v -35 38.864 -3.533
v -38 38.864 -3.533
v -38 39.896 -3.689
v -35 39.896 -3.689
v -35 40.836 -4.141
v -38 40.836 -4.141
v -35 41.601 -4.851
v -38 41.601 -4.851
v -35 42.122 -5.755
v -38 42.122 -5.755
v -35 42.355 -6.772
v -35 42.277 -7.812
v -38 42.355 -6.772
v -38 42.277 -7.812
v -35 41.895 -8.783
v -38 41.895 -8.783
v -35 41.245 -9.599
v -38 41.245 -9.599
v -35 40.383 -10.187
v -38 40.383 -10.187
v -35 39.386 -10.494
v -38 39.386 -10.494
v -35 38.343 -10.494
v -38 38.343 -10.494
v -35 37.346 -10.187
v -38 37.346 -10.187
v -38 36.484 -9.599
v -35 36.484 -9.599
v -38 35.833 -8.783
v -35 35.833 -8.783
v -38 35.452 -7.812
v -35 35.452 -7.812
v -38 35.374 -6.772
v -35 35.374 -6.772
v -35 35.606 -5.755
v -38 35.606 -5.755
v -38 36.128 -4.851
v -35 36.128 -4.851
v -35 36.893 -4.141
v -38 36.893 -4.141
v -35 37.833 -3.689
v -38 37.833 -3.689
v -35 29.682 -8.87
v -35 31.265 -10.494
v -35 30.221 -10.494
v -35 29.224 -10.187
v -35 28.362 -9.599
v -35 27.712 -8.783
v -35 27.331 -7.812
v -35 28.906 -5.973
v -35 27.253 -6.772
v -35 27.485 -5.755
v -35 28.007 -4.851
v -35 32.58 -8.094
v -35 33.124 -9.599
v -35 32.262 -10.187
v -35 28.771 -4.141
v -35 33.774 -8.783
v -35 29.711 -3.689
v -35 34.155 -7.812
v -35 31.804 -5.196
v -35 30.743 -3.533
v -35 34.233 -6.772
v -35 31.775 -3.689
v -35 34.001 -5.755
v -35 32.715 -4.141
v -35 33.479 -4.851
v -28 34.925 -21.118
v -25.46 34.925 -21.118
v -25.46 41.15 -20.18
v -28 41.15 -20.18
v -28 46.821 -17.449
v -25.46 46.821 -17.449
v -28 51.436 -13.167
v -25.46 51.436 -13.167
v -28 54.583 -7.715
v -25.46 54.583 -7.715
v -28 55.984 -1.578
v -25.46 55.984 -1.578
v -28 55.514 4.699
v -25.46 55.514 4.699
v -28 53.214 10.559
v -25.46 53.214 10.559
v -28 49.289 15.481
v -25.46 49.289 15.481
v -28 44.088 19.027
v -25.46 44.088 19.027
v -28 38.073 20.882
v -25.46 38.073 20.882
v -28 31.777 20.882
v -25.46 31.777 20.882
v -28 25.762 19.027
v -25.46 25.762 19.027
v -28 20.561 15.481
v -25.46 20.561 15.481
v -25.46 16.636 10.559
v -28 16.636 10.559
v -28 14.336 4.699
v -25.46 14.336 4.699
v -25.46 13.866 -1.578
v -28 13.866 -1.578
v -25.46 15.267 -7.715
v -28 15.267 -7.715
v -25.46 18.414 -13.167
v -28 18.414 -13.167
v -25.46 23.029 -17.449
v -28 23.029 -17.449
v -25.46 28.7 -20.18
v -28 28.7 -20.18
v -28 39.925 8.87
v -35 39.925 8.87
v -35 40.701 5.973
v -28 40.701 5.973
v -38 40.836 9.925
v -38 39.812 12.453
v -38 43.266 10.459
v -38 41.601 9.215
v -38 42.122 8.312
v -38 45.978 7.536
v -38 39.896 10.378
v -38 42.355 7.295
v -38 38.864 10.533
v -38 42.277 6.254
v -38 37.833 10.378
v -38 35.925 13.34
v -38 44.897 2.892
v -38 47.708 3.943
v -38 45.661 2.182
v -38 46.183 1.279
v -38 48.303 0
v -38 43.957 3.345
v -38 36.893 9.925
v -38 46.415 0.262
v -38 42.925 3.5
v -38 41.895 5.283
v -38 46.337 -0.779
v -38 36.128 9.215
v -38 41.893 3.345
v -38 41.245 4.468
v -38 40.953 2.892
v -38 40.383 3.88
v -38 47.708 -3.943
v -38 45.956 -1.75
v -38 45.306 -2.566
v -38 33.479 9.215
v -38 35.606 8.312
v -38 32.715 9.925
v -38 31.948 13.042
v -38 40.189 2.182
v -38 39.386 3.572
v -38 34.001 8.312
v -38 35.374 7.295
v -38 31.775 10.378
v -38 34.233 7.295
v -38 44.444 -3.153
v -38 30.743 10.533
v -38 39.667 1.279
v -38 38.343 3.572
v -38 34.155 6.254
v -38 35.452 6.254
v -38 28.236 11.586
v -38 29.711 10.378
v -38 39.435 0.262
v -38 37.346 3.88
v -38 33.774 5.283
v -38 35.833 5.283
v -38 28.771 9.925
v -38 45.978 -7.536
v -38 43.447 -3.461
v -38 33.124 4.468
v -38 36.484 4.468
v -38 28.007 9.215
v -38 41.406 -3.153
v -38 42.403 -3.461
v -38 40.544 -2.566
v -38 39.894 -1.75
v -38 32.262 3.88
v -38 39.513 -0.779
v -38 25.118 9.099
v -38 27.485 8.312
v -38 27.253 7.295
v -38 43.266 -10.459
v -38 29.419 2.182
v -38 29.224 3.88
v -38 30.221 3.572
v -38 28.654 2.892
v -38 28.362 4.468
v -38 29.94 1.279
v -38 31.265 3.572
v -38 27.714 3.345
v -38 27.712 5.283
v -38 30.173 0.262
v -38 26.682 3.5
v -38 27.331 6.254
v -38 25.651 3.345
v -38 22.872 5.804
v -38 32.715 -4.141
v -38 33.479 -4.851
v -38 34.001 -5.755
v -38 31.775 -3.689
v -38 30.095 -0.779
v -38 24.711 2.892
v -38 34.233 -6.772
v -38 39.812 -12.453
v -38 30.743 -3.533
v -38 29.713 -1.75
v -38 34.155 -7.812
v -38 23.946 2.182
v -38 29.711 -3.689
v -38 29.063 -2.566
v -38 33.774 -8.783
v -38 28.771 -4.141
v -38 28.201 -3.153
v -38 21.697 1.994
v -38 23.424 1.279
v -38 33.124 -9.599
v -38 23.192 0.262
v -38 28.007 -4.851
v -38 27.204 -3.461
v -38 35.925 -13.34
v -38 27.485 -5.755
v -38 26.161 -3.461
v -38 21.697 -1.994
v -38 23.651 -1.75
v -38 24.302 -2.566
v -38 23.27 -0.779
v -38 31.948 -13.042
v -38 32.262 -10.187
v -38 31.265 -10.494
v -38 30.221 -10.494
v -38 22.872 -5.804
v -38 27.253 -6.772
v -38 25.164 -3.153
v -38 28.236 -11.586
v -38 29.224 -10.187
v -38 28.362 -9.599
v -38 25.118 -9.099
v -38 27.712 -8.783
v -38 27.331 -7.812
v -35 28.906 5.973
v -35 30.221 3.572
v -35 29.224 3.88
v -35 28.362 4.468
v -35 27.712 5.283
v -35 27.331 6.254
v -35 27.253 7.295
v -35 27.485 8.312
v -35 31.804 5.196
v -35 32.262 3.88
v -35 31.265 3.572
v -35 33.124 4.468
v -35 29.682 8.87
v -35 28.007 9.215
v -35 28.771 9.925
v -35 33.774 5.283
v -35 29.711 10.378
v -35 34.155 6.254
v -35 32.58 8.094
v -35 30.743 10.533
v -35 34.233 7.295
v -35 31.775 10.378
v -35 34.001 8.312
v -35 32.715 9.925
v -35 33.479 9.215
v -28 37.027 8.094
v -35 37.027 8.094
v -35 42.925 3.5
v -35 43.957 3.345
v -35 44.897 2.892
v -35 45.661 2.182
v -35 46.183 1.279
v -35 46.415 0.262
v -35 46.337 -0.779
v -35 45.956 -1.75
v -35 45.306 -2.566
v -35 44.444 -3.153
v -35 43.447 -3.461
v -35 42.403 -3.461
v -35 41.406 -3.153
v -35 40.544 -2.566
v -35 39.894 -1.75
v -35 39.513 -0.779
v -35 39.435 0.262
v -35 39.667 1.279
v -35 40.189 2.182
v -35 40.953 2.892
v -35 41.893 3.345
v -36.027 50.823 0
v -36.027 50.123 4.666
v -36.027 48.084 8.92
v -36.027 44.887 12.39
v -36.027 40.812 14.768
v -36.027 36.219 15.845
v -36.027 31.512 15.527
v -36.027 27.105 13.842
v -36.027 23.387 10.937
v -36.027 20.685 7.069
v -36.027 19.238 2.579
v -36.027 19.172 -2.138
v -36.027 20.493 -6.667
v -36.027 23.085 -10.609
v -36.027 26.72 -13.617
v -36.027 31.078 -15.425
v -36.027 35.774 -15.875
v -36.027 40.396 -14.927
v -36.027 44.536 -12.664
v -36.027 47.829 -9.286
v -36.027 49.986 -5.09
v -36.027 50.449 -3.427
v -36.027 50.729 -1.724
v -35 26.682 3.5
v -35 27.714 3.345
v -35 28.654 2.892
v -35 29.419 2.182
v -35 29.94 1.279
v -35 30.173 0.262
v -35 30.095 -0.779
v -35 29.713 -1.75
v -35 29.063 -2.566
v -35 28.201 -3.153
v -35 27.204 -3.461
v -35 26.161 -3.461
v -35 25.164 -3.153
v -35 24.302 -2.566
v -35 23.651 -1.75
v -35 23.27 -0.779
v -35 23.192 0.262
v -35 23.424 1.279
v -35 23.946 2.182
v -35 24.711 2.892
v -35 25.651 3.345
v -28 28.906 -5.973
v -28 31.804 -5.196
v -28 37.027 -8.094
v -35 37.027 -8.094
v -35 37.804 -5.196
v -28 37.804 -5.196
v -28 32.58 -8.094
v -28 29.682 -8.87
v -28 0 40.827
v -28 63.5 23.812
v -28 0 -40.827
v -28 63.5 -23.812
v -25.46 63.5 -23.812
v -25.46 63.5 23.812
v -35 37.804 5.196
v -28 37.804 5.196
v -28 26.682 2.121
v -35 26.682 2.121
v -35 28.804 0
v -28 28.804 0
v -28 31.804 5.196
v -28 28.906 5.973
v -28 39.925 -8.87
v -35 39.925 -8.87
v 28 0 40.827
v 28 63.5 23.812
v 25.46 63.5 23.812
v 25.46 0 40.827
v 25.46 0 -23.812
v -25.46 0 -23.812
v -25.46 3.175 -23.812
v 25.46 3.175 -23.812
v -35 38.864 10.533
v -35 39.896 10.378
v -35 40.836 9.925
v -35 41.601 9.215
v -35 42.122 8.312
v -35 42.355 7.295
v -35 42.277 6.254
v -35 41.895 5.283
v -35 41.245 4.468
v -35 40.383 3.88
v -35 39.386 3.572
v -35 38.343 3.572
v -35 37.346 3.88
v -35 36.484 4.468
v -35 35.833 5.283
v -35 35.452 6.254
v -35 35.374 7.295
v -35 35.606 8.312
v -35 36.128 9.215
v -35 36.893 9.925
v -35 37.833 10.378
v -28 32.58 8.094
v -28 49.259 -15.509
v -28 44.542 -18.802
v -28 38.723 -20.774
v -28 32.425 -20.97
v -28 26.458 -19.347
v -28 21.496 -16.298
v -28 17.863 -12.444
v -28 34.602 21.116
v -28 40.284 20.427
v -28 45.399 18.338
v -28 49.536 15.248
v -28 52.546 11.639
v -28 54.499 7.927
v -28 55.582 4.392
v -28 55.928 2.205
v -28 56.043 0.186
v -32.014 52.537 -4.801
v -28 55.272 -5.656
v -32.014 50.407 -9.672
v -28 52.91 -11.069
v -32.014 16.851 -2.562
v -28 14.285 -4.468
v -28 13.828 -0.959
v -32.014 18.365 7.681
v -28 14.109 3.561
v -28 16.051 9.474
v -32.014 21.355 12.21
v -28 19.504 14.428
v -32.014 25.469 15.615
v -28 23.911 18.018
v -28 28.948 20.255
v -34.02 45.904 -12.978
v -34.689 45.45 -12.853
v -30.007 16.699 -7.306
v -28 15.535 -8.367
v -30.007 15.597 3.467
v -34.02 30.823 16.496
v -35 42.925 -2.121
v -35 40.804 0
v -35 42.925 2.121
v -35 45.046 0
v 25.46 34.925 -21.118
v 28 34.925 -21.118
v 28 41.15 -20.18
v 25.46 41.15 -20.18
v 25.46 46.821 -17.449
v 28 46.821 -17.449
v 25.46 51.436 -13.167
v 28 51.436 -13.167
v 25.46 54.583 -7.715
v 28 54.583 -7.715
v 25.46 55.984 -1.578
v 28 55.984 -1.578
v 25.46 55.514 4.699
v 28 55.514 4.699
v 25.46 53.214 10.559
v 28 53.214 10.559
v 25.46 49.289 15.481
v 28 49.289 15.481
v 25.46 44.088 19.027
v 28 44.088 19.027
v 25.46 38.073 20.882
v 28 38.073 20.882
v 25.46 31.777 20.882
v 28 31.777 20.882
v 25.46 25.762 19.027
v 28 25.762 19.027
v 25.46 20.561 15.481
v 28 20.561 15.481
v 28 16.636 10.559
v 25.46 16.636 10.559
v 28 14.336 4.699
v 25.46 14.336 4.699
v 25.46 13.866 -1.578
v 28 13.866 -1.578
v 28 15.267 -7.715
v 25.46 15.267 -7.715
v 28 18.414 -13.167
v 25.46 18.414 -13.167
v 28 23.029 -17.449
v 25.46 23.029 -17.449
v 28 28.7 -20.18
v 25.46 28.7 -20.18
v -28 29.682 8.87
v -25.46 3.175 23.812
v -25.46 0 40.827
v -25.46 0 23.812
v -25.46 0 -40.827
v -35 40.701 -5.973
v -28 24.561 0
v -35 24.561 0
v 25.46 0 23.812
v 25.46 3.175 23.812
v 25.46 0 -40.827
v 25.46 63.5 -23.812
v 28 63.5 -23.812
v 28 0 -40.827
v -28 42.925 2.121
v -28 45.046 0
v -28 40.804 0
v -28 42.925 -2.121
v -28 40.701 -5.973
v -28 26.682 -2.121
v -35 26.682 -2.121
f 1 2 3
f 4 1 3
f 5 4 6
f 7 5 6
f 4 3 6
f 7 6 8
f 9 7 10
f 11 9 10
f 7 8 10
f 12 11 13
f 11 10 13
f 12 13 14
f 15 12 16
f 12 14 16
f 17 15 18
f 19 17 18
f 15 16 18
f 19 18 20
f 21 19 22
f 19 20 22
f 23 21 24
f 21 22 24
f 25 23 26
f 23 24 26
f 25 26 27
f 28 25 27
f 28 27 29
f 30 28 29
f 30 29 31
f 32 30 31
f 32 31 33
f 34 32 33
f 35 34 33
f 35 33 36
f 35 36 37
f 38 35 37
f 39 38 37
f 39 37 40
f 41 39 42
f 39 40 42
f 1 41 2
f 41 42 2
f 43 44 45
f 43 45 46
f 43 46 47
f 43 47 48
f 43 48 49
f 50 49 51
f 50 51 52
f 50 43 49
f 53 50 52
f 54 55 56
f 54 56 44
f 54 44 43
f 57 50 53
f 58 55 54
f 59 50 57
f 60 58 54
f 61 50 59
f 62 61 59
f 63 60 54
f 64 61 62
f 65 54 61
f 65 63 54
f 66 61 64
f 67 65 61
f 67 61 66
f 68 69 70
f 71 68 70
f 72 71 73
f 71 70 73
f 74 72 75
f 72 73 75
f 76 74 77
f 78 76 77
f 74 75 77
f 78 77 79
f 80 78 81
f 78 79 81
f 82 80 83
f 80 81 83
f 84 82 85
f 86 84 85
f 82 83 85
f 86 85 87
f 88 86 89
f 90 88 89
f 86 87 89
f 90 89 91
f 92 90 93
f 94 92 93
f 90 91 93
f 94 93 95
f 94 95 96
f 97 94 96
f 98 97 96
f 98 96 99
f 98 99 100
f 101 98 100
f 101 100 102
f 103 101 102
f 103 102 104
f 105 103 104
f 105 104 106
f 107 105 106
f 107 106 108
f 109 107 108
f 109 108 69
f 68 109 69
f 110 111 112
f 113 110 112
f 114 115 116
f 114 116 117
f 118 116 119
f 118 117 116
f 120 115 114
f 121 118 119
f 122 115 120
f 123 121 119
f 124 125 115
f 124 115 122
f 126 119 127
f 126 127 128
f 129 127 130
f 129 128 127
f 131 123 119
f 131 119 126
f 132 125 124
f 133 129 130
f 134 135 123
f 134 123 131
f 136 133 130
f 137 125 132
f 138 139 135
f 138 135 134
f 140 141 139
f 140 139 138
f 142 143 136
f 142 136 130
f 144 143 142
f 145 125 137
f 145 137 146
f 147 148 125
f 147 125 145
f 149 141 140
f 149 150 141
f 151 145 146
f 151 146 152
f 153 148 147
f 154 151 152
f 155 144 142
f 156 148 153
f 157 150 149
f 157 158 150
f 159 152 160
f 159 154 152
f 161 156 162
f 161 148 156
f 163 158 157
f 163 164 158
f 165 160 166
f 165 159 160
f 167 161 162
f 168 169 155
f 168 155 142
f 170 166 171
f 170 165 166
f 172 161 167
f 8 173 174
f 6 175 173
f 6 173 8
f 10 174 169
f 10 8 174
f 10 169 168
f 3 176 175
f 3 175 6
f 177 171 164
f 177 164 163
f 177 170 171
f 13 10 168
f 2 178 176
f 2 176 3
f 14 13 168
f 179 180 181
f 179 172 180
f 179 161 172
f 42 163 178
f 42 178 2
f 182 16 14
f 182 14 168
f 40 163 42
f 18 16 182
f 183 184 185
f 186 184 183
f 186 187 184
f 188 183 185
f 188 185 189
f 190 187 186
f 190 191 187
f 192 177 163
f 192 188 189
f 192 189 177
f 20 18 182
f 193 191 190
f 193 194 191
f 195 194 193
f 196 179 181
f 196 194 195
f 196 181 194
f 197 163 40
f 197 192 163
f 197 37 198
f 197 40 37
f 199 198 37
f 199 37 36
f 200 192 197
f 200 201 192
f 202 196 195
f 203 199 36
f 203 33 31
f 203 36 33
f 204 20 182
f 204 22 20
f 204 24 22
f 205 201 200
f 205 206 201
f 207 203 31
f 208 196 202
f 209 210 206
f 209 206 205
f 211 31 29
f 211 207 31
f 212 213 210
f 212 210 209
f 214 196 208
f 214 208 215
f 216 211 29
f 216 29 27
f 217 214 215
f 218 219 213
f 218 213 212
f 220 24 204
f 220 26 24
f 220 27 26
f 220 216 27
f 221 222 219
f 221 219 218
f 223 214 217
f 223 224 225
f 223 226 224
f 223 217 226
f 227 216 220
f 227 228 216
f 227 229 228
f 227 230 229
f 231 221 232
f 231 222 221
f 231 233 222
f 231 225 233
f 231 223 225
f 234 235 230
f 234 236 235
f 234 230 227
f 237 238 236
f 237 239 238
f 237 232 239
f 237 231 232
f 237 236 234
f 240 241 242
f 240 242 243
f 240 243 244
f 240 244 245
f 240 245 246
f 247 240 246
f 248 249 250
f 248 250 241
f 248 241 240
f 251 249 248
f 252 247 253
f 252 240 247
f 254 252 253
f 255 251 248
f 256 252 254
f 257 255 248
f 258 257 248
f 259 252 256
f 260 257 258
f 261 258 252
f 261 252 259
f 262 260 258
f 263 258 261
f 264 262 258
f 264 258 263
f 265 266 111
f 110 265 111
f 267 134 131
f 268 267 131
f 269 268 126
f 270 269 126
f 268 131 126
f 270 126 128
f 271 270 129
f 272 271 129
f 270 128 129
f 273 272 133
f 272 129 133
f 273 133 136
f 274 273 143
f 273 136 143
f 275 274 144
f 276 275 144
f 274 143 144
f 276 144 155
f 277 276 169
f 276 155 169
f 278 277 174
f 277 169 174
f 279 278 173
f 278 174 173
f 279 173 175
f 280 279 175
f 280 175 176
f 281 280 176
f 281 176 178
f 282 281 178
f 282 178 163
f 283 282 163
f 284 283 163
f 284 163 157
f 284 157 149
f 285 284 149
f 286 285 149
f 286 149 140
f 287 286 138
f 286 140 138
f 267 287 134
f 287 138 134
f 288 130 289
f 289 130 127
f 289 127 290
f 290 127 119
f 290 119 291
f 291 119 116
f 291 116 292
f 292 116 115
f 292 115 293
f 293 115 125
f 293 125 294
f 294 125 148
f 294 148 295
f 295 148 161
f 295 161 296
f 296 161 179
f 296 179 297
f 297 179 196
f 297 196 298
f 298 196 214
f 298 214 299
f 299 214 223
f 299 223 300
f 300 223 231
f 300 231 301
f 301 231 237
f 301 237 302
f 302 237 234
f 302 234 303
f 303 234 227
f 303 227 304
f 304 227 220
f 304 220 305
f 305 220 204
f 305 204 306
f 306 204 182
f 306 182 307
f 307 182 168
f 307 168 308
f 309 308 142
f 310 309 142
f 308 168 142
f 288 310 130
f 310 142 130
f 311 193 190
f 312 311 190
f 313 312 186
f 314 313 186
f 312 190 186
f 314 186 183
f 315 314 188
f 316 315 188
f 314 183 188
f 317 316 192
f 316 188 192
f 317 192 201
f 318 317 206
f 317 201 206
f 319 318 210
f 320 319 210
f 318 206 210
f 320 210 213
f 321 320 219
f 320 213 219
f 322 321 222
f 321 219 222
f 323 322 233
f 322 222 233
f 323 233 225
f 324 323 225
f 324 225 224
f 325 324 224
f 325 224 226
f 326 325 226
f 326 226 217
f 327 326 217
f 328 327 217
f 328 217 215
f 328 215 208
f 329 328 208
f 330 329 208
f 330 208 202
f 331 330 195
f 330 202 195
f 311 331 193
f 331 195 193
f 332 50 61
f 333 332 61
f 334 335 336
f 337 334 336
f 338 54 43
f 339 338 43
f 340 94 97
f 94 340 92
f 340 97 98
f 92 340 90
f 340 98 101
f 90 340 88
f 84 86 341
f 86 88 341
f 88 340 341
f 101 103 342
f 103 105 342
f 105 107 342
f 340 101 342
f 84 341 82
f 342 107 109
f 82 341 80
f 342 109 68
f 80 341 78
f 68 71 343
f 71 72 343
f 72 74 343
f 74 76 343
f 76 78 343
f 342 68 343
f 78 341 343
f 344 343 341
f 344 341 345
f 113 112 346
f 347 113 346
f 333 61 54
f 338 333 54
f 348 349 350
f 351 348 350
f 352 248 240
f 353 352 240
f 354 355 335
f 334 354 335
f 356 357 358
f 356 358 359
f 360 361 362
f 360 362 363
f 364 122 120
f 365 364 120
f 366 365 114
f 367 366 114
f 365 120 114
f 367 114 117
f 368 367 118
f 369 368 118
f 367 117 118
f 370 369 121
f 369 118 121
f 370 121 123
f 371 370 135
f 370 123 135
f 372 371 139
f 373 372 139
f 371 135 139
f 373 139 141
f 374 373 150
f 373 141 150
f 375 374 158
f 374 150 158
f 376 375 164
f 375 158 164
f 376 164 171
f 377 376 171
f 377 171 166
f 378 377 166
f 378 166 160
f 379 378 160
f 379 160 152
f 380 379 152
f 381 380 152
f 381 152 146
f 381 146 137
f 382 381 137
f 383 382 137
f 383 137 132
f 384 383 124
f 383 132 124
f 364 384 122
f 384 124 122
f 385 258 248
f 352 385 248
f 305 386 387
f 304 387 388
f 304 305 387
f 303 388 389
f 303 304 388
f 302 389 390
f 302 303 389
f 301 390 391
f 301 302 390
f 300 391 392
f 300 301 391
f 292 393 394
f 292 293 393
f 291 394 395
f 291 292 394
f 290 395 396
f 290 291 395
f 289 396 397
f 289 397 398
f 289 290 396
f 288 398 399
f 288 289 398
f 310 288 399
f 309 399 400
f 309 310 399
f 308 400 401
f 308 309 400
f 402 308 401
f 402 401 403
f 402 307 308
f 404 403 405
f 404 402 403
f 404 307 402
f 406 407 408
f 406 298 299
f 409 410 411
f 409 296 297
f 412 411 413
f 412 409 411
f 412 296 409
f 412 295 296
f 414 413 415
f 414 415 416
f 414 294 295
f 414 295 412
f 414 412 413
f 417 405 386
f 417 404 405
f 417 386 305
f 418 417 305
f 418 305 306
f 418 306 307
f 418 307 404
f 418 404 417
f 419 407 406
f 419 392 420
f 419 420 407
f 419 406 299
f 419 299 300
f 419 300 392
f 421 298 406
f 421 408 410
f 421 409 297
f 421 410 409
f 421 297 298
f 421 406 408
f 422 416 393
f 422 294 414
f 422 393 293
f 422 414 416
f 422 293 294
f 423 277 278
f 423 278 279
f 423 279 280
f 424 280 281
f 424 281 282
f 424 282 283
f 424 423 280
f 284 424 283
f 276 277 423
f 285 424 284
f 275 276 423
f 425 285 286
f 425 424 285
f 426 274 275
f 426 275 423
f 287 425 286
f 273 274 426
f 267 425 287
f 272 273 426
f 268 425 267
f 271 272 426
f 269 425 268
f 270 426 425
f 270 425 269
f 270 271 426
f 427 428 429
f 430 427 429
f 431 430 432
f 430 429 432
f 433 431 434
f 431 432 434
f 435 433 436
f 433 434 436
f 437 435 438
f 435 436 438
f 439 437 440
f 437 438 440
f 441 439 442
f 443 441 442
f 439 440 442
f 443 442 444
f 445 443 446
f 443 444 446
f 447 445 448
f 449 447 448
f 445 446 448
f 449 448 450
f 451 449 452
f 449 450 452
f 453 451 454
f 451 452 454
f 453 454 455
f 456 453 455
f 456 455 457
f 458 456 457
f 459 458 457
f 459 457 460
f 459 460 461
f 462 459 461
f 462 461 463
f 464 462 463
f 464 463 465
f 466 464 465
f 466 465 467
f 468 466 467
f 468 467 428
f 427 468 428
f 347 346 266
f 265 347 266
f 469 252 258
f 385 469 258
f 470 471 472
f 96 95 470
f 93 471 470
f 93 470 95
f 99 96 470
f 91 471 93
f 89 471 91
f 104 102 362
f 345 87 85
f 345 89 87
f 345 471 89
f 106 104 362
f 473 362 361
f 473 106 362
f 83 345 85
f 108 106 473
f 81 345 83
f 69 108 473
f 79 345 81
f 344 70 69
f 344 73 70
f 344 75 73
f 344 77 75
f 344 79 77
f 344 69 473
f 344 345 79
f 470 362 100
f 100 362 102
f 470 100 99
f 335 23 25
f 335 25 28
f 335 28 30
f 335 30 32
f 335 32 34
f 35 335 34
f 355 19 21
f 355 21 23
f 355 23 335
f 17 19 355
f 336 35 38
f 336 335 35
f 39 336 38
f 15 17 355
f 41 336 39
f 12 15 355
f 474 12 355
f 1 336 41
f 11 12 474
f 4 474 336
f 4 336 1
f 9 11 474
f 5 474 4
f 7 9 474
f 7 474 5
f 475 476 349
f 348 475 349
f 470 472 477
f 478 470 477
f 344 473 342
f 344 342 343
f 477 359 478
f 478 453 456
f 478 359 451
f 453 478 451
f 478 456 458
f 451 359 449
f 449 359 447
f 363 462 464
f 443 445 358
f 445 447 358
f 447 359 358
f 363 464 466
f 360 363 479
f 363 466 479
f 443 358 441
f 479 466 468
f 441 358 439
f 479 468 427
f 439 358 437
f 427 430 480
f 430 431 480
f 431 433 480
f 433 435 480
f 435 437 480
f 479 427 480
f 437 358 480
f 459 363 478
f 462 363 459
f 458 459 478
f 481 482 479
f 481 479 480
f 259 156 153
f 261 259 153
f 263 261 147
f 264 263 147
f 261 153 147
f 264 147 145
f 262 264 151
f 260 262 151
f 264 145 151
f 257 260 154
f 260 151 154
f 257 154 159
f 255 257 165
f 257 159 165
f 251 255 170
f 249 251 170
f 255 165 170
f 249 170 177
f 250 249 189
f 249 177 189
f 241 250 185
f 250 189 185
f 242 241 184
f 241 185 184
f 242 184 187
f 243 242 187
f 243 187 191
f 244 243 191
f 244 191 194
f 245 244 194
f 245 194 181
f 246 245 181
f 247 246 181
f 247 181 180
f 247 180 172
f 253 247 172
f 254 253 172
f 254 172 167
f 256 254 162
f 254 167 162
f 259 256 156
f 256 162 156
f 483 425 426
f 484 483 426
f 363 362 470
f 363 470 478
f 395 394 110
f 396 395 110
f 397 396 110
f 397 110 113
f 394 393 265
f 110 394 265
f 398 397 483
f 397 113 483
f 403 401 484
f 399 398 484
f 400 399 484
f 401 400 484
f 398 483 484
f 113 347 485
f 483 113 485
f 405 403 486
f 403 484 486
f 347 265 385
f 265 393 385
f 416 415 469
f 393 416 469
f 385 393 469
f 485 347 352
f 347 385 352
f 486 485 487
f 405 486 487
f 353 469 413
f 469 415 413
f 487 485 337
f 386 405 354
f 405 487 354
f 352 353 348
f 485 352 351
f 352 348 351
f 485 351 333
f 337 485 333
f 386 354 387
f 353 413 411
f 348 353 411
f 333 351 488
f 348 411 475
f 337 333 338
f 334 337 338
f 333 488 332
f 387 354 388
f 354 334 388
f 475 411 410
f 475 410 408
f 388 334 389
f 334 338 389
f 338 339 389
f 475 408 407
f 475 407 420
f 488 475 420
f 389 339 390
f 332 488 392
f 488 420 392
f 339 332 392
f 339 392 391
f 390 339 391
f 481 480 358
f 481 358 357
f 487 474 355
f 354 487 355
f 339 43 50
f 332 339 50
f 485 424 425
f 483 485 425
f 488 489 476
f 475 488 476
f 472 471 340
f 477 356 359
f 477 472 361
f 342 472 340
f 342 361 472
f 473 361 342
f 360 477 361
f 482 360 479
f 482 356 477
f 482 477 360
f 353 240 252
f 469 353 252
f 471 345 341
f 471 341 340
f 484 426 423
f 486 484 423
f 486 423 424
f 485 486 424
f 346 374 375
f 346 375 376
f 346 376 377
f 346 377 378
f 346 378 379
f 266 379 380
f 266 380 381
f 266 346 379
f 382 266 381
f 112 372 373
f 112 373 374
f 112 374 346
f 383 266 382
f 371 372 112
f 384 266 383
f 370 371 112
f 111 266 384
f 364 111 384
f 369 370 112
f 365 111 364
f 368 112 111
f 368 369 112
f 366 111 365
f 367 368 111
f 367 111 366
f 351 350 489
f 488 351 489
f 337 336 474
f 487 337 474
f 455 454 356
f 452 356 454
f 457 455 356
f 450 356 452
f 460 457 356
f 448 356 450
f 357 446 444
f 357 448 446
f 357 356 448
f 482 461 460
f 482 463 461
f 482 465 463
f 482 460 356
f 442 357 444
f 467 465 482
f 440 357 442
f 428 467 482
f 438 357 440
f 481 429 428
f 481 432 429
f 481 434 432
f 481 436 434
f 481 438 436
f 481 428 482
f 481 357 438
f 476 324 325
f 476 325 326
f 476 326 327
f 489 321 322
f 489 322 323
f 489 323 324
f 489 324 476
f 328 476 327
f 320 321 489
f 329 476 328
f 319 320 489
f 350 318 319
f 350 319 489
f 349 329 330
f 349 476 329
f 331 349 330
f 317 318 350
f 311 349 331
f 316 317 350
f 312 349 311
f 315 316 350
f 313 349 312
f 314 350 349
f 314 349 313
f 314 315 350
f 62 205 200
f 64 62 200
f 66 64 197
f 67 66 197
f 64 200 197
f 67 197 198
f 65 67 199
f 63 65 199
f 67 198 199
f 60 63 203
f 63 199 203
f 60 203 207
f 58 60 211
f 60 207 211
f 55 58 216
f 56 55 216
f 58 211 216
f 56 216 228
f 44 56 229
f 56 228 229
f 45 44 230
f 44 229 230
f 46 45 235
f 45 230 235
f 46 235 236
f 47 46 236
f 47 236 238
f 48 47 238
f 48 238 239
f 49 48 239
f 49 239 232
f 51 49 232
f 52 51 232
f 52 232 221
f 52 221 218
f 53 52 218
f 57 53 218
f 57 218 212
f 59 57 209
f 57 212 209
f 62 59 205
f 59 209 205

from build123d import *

# Parameters (mm, degrees)
SKETCH1_W           = 56
SKETCH1_H           = 47.625
BOSS_EXTRUDE1_DEPTH = 3.175
SKETCH3_W           = 2.54
SKETCH3_H           = 47.625
BOSS_EXTRUDE3_DEPTH = 60.325
SKETCH4_R           = 21.118322
CUT_EXTRUDE1_DEPTH  = 88.950469904
BOSS_EXTRUDE6_DEPTH = 2.54
BOSS_EXTRUDE7_DEPTH = 2.54
CUT_EXTRUDE4_DEPTH  = 10
SKETCH15_3_R        = 3.5
CUT_EXTRUDE5_DEPTH  = 3


with BuildPart() as part:
    # Sketch1 → Boss-Extrude1 (new body)
    with BuildSketch(Plane(origin=(0, 0, 0), x_dir=(1, 0, 0), z_dir=(0, 1, 0))):
        Rectangle(SKETCH1_W, SKETCH1_H)
    extrude(amount=BOSS_EXTRUDE1_DEPTH)

    # Sketch3 → Boss-Extrude3 (add)
    with BuildSketch(Plane(origin=(0, 3.175, 0), x_dir=(1, 0, 0), z_dir=(0, 1, 0))):
        with Locations((-26.73, 0)):
            Rectangle(SKETCH3_W, SKETCH3_H)
        with Locations((26.73, 0)):
            Rectangle(SKETCH3_W, SKETCH3_H)
    extrude(amount=BOSS_EXTRUDE3_DEPTH)

    # Sketch4 → Cut-Extrude1 (cut, through all)
    with BuildSketch(Plane(origin=(28, 0, 0), x_dir=(0, 0, -1), z_dir=(1, 0, 0))):
        with Locations((0, 34.925)):
            Circle(SKETCH4_R)
    extrude(amount=-CUT_EXTRUDE1_DEPTH, mode=Mode.SUBTRACT)

    # Sketch8 → Boss-Extrude6 (add)
    with BuildSketch(Plane(origin=(-25.46, 0, 0), x_dir=(0, 0, -1), z_dir=(1, 0, 0))):
        Polygon((23.8125, 63.5), (23.8125, 3.175), (23.8125, 0), (40.827273719, 0), align=None)
        Polygon((-23.8125, 63.5), (-40.827273719, 0), (-23.8125, 0), (-23.8125, 3.175), align=None)
    extrude(amount=-BOSS_EXTRUDE6_DEPTH)

    # Sketch9 → Boss-Extrude7 (add)
    with BuildSketch(Plane(origin=(28, 0, 0), x_dir=(0, 0, -1), z_dir=(1, 0, 0))):
        Polygon((23.8125, 0), (40.827273719, 0), (23.8125, 63.5), align=None)
        Polygon((-23.8125, 63.5), (-40.827273719, 0), (-23.8125, 0), align=None)
    extrude(amount=-BOSS_EXTRUDE7_DEPTH)


with BuildPart() as body_2:
    # Loft1: read off the stored shape, not the designer's step
    # Loft1: loft between two sections, ruled curve by curve
    loft1_from = [
        Edge.make_bspline([(-28, 56.042504962, 0.185764067), (-28, 56.414033096, -42.049245856), (-28, 14.179023172, -42.42077399), (-28, 13.807495038, -0.185764067), (-28, 13.435966904, 42.049245856), (-28, 55.670976828, 42.42077399), (-28, 56.042504962, 0.185764067)], [0, 0, 0, 0, 0.5, 0.5, 0.5, 1, 1, 1, 1], 3, [1, 0.333333333, 0.333333333, 1, 0.333333333, 0.333333333, 1]),
    ]
    loft1_to = [
        Edge.make_bspline([(-38, 48.497405787, -6.386689373), (-38, 35.72402704, -33.531500947), (-38, 8.579215466, -20.758122201), (-38, 21.352594213, 6.386689373), (-38, 34.12597296, 33.531500947), (-38, 61.270784534, 20.758122201), (-38, 48.497405787, -6.386689373)], [0, 0, 0, 0, 0.5, 0.5, 0.5, 1, 1, 1, 1], 3, [1, 0.333333333, 0.333333333, 1, 0.333333333, 0.333333333, 1]),
    ]
    loft1 = Solid(Shell([*[Face.make_surface_from_curves(loft1_from[k], loft1_to[k]) for k in range(1)], Face(Wire(loft1_from)), Face(Wire(loft1_to))]))
    add(loft1)

    # Chamfer1: read off the stored shape, not the designer's step
    # Chamfer1 outline → Chamfer1 (revolve, cut)
    with BuildSketch(Plane(origin=(0, 34.925, 0), x_dir=(0, 1, 0), z_dir=(0, 0, -1))):
        Polygon((15.897867596, -36.027042539), (13.377813263, -38), (15.897867596, -38), align=None)
    revolve(axis=Axis((0, 34.925, 0), (1, 0, 0)), mode=Mode.SUBTRACT)

    # Sketch15 → Cut-Extrude4 (cut)
    with BuildSketch(Plane.ZY.offset(38)):
        Polygon((-2.121320344, 42.925), (0, 40.803679656), (2.121320344, 42.925), (0, 45.046320344), align=None)
        Polygon((-5.972609558, 40.701457135), (-8.870387037, 39.925), (-8.093929902, 37.027222521), (-5.196152423, 37.803679656), align=None)
        Polygon((-8.093929902, 32.580136792), (-8.870387037, 29.682359313), (-5.972609558, 28.905902178), (-5.196152423, 31.803679656), align=None)
        Polygon((0, 28.803679656), (-2.121320344, 26.682359313), (0, 24.561038969), (2.121320344, 26.682359313), align=None)
        Polygon((8.870387037, 29.682359313), (8.093929902, 32.580136792), (5.196152423, 31.803679656), (5.972609558, 28.905902178), align=None)
        Polygon((8.093929902, 37.027222521), (8.870387037, 39.925), (5.972609558, 40.701457135), (5.196152423, 37.803679656), align=None)
    extrude(amount=-CUT_EXTRUDE4_DEPTH, mode=Mode.SUBTRACT)

    # Sketch15<3> → Cut-Extrude5 (cut)
    # profile 1 of 6: a face of its own
    with BuildSketch(Plane.ZY.offset(38)):
        with Locations((0, 42.925)):
            Circle(SKETCH15_3_R)
        Polygon((0, 45.046320344), (2.121320344, 42.925), (0, 40.803679656), (-2.121320344, 42.925), align=None, mode=Mode.SUBTRACT)
    # profile 2 of 6: a face of its own
    with BuildSketch(Plane.ZY.offset(38)):
        with Locations((7.03326973, 38.864339828)):
            Circle(SKETCH15_3_R)
        Polygon((5.972609558, 40.701457135), (8.870387037, 39.925), (8.093929902, 37.027222521), (5.196152423, 37.803679656), align=None, mode=Mode.SUBTRACT)
    # profile 3 of 6: a face of its own
    with BuildSketch(Plane.ZY.offset(38)):
        with Locations((7.03326973, 30.743019485)):
            Circle(SKETCH15_3_R)
        Polygon((8.093929902, 32.580136792), (8.870387037, 29.682359313), (5.972609558, 28.905902178), (5.196152423, 31.803679656), align=None, mode=Mode.SUBTRACT)
    # profile 4 of 6: a face of its own
    with BuildSketch(Plane.ZY.offset(38)):
        with Locations((0, 26.682359313)):
            Circle(SKETCH15_3_R)
        Polygon((2.121320344, 26.682359313), (0, 24.561038969), (-2.121320344, 26.682359313), (0, 28.803679656), align=None, mode=Mode.SUBTRACT)
    # profile 5 of 6: a face of its own
    with BuildSketch(Plane.ZY.offset(38)):
        with Locations((-7.03326973, 30.743019485)):
            Circle(SKETCH15_3_R)
        Polygon((-5.972609558, 28.905902178), (-8.870387037, 29.682359313), (-8.093929902, 32.580136792), (-5.196152423, 31.803679656), align=None, mode=Mode.SUBTRACT)
    # profile 6 of 6: a face of its own
    with BuildSketch(Plane.ZY.offset(38)):
        with Locations((-7.03326973, 38.864339828)):
            Circle(SKETCH15_3_R)
        Polygon((-8.093929902, 37.027222521), (-8.870387037, 39.925), (-5.972609558, 40.701457135), (-5.196152423, 37.803679656), align=None, mode=Mode.SUBTRACT)
    extrude(amount=-CUT_EXTRUDE5_DEPTH, mode=Mode.SUBTRACT)


solid = Compound([part.part, body_2.part])
